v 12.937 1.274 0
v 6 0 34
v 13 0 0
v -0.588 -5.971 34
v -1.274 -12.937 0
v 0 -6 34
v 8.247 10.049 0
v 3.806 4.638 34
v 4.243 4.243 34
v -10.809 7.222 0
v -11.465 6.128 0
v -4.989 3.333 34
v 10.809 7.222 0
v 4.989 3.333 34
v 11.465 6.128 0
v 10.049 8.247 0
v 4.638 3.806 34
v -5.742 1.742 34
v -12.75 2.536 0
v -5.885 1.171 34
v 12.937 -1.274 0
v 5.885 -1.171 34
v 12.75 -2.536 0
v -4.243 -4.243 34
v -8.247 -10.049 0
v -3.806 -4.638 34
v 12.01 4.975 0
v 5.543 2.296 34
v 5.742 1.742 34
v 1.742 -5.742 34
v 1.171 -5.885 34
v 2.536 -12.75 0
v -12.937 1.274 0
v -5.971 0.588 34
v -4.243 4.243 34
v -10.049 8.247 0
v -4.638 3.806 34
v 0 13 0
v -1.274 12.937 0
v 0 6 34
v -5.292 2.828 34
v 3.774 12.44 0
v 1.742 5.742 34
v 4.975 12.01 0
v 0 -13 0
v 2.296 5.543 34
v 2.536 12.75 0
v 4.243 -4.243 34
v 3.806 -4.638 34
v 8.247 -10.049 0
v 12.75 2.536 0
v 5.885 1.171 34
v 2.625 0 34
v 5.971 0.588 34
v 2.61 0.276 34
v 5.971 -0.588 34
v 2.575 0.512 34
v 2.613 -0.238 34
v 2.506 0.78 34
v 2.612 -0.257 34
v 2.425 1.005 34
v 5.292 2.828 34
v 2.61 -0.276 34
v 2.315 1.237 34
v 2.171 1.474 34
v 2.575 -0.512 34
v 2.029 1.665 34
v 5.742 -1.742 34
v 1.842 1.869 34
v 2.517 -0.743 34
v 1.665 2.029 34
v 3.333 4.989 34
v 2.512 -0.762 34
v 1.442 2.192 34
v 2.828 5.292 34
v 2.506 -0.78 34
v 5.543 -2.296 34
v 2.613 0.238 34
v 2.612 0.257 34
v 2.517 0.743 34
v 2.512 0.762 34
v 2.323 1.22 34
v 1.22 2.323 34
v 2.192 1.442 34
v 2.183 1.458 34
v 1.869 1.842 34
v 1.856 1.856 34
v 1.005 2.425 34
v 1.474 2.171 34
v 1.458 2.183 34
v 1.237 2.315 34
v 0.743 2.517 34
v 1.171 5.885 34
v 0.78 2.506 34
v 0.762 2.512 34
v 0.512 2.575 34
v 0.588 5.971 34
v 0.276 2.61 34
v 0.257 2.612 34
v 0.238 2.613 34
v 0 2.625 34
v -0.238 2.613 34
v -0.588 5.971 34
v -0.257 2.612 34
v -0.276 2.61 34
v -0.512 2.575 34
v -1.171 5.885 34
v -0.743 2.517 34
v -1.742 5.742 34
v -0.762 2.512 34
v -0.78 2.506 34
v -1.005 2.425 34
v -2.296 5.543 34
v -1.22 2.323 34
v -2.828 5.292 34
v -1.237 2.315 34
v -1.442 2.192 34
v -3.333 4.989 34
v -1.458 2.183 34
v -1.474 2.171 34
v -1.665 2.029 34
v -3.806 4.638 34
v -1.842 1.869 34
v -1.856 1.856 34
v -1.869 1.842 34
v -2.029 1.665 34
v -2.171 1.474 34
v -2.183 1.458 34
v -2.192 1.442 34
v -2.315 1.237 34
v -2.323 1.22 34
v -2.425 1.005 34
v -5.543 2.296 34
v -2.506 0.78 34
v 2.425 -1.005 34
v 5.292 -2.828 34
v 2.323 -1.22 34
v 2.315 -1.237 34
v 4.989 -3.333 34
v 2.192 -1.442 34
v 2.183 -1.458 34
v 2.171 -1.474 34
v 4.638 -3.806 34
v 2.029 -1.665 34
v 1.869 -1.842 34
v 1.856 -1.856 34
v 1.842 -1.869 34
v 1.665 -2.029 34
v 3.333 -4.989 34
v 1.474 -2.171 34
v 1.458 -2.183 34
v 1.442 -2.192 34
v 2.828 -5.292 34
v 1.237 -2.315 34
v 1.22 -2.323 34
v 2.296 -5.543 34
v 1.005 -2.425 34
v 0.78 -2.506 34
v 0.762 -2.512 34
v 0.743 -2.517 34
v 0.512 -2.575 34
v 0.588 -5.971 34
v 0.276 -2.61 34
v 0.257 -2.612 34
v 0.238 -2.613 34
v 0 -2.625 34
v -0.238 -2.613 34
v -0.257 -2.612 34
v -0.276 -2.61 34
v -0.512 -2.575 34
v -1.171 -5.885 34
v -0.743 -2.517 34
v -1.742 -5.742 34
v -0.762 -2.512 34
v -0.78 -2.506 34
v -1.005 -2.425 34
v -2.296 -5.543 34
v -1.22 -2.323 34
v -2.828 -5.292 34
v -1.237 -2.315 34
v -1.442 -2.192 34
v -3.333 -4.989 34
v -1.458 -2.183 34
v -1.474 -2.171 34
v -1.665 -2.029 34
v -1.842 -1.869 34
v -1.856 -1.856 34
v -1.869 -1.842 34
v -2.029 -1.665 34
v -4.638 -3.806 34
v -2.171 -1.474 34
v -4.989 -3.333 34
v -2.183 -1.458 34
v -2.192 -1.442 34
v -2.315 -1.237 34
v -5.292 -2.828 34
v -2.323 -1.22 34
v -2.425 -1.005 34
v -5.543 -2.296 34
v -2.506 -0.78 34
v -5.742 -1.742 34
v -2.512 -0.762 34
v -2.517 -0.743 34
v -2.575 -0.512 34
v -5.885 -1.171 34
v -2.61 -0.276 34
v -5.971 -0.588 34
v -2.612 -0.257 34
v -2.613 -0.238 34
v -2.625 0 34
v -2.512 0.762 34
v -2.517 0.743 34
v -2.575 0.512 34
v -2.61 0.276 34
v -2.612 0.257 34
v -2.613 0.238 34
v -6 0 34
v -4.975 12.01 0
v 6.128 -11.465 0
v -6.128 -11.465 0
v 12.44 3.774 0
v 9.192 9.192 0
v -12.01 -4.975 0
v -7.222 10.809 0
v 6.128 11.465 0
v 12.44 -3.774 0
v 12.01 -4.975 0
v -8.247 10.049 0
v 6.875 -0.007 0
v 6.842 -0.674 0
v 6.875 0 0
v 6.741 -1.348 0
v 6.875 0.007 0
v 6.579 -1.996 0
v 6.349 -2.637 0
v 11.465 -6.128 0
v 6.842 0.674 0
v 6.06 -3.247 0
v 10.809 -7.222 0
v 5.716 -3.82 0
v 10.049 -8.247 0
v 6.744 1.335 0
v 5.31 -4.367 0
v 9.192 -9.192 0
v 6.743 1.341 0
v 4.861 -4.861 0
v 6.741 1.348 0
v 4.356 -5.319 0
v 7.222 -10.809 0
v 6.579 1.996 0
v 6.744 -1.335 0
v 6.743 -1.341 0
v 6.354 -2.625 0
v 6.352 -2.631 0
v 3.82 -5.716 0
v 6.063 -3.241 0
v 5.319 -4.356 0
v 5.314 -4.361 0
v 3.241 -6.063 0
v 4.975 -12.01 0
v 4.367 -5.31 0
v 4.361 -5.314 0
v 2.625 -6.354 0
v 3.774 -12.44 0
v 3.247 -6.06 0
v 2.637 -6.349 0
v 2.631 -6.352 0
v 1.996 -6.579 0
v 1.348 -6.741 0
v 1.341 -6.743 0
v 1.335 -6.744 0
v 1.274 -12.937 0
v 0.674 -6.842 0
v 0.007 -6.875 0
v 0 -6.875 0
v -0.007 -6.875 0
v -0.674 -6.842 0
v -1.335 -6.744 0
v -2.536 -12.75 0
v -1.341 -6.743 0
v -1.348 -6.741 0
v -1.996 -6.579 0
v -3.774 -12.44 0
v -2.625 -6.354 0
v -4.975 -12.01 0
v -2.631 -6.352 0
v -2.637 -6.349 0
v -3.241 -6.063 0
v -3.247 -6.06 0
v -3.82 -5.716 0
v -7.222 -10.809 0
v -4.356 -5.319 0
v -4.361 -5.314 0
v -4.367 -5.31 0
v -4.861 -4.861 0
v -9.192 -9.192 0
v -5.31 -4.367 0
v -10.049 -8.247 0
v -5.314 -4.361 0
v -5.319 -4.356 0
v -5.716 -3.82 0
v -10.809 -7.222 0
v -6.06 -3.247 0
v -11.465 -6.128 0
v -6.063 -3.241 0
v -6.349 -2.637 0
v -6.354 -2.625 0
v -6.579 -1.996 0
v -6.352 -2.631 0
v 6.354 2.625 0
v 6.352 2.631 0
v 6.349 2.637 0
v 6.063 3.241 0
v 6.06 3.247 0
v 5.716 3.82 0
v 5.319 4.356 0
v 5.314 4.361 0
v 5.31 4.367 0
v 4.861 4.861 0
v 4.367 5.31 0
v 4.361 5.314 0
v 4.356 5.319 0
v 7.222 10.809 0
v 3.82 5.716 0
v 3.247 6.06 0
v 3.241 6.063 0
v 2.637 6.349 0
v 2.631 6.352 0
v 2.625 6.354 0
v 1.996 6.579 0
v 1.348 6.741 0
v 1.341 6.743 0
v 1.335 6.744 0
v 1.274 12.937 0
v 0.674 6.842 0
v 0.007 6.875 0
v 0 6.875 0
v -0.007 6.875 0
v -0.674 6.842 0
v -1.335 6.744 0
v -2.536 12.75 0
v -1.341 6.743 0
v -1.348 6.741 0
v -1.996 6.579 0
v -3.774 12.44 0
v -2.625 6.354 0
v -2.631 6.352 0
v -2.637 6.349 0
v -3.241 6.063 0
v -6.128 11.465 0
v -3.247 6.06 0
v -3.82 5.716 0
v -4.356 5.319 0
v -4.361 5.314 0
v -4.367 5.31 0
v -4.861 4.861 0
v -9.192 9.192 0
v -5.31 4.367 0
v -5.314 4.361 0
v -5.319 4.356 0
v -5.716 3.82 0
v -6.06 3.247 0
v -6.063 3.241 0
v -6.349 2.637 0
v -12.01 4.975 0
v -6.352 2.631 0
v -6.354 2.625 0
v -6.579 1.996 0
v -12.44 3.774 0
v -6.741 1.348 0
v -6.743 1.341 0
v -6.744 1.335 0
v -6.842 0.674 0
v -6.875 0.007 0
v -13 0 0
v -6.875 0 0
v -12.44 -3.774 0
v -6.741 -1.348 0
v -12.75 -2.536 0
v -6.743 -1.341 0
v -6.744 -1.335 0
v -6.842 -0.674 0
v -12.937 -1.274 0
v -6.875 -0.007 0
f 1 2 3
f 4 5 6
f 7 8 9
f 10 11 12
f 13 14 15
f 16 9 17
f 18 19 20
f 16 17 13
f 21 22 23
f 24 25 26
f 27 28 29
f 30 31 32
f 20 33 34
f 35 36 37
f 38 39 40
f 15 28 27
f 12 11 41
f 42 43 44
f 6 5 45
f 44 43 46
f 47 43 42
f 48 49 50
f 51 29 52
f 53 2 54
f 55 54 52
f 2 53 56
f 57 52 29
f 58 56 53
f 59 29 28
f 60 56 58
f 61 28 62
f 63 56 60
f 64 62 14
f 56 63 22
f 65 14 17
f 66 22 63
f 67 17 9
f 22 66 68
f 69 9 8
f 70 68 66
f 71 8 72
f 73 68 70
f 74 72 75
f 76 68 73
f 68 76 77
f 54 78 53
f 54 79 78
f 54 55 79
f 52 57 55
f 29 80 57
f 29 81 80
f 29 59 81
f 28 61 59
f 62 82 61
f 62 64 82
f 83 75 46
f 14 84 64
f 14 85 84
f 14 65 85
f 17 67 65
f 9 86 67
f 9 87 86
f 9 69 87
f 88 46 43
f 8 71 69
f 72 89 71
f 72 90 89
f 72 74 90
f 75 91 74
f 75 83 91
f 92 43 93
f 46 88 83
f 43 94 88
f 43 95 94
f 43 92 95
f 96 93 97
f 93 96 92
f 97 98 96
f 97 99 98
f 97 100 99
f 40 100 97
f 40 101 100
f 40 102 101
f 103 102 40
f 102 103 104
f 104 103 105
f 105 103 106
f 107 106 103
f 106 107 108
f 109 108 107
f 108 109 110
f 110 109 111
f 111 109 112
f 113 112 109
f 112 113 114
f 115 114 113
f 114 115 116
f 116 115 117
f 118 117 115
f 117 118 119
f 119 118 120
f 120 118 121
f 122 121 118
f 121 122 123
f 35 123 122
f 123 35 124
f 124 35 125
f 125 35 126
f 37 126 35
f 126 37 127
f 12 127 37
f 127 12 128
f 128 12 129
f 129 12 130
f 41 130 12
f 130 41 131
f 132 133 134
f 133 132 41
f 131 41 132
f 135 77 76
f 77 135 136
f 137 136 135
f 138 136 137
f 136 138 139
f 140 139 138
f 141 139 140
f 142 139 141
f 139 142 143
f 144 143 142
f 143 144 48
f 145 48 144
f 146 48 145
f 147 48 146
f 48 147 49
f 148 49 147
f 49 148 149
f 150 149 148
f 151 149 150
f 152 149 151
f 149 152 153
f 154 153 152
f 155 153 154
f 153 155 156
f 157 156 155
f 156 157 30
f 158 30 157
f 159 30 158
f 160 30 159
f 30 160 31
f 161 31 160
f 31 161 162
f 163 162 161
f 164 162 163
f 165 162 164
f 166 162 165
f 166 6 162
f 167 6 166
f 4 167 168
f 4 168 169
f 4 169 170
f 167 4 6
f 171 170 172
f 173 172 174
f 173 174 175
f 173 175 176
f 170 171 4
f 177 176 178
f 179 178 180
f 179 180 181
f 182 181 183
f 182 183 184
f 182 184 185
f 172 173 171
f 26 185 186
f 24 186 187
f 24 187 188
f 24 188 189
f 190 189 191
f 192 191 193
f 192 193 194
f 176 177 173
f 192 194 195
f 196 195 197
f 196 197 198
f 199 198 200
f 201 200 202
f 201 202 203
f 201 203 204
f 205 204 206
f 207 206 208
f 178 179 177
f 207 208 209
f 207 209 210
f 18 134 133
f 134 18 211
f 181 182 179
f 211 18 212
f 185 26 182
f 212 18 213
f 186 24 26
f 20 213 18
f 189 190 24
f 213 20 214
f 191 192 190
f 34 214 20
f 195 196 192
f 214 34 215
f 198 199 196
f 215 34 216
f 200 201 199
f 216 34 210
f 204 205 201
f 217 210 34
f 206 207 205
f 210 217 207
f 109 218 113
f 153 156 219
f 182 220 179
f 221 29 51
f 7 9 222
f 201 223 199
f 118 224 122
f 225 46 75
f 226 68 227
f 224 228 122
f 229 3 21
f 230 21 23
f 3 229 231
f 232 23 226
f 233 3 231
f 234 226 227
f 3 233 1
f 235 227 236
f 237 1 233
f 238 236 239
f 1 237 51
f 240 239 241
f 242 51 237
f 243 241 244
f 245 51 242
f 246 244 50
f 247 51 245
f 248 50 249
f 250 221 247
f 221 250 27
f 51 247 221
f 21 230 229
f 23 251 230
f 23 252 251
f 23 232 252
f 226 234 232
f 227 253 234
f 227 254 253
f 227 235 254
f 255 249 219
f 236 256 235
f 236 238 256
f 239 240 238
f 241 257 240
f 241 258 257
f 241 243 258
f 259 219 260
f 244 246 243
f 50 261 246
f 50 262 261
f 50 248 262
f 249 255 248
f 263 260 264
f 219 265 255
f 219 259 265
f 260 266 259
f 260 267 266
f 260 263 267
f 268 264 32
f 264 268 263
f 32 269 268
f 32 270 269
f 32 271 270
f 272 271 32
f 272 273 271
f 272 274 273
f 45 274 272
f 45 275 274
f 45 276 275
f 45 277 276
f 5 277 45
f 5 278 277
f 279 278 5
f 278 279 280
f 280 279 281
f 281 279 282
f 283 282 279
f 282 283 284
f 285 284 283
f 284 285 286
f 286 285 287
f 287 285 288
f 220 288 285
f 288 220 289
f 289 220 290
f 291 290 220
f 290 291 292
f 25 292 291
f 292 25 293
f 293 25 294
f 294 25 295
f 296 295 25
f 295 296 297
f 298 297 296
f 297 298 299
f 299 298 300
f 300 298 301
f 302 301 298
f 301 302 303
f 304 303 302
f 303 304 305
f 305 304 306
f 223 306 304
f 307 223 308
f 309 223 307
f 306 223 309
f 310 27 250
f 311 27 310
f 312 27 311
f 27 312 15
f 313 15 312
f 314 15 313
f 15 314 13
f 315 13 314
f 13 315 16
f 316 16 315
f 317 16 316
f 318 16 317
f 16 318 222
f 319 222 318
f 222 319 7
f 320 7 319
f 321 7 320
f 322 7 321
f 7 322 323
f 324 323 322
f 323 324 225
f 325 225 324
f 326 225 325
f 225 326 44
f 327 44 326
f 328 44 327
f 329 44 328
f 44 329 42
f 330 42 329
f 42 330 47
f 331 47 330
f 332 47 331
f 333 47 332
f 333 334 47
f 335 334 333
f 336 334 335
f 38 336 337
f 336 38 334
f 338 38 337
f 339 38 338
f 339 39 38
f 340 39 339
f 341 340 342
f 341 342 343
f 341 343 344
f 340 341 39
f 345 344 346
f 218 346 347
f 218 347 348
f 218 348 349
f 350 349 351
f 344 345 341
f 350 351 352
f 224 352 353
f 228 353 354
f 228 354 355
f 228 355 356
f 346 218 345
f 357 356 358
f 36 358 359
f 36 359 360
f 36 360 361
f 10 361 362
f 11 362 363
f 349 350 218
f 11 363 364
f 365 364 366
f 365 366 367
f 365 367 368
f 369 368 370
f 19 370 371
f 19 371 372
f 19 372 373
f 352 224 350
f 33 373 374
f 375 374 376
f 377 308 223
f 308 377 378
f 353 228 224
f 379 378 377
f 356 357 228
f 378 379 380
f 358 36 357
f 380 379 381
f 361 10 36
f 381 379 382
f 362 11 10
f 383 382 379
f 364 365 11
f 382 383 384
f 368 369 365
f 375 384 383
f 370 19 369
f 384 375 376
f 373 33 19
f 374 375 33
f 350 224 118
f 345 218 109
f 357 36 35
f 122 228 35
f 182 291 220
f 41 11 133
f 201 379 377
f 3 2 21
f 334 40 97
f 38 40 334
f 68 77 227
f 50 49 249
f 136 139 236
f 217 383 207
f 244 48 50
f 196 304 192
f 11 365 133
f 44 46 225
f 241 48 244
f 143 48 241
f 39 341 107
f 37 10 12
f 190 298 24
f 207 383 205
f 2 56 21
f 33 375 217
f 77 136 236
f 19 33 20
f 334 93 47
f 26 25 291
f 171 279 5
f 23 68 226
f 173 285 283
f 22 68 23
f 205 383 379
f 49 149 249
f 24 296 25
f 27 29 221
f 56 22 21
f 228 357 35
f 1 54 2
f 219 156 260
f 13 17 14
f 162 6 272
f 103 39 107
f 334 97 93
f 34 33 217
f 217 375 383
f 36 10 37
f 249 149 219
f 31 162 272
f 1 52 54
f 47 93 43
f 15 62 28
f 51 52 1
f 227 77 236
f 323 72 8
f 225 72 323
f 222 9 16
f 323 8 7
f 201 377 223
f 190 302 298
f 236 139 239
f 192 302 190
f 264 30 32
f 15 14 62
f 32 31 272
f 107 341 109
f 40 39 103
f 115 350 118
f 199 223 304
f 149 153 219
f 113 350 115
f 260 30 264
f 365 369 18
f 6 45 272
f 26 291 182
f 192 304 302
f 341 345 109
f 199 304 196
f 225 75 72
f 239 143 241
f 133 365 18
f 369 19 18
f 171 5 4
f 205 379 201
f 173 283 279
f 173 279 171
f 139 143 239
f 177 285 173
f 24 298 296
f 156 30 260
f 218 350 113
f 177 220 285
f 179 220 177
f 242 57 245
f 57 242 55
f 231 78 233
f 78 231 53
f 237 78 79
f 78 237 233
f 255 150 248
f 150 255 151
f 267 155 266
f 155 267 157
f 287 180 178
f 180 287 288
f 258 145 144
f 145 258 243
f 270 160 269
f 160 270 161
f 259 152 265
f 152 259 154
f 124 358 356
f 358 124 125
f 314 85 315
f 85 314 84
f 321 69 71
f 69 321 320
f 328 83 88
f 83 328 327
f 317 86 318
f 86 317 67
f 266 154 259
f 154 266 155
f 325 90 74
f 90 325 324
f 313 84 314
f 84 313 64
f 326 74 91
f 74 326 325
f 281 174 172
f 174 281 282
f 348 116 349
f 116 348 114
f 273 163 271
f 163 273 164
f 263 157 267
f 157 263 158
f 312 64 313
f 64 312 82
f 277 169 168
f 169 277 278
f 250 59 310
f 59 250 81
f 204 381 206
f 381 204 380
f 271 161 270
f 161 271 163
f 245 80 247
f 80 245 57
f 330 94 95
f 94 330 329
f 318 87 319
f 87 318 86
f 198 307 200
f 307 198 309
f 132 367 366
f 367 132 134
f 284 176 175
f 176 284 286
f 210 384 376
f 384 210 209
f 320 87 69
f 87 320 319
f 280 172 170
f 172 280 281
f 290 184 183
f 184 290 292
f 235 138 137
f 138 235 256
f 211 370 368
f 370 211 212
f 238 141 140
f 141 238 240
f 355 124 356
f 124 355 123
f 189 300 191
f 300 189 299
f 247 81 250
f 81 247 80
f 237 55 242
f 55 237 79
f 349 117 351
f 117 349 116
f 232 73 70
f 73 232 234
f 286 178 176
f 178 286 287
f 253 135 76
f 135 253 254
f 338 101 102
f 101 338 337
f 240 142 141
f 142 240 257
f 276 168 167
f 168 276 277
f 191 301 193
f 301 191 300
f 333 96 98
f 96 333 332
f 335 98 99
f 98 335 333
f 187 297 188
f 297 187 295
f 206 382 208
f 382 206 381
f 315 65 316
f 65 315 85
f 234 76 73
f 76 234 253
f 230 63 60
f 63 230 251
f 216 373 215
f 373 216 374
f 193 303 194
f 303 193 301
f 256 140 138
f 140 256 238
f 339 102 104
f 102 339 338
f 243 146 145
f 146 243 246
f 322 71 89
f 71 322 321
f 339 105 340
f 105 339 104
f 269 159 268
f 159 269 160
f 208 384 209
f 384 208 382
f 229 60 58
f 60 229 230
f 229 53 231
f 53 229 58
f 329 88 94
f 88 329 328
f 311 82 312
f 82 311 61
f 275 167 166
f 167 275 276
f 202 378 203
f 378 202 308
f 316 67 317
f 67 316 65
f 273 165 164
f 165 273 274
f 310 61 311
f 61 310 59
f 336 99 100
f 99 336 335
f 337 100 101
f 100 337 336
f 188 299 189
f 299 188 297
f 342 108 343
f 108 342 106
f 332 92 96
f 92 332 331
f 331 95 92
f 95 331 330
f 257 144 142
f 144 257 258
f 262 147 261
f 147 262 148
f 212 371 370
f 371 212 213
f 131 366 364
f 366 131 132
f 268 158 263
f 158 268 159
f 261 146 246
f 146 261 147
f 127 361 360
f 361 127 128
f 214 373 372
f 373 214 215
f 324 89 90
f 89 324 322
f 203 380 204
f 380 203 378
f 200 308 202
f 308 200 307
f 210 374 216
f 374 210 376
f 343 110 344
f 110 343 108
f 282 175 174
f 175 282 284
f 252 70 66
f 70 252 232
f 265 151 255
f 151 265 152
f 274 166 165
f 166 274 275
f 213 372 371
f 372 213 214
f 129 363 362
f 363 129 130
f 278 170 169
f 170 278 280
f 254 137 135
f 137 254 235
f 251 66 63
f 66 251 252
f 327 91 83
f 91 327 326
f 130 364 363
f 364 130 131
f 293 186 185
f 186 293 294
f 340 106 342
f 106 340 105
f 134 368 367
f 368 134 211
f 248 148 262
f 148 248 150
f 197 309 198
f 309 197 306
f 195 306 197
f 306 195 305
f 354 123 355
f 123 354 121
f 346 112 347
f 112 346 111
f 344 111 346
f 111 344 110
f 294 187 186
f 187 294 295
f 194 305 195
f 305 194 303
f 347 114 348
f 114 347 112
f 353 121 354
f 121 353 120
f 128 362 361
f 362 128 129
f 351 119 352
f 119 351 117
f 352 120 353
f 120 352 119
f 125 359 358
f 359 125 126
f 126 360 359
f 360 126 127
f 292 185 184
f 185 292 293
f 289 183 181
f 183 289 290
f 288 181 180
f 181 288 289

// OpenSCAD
// Starter tapered nozzle for task-012.
$fn = 64;

height = 34;
bottom_od = 26;
top_od = 12;
bottom_bore_diameter = 14;
top_bore_diameter = 5;

difference() {
  cylinder(h = height, r1 = bottom_od / 2, r2 = top_od / 2);
  translate([0, 0, -1])
    cylinder(h = height + 2, r1 = bottom_bore_diameter / 2, r2 = top_bore_diameter / 2);
}
